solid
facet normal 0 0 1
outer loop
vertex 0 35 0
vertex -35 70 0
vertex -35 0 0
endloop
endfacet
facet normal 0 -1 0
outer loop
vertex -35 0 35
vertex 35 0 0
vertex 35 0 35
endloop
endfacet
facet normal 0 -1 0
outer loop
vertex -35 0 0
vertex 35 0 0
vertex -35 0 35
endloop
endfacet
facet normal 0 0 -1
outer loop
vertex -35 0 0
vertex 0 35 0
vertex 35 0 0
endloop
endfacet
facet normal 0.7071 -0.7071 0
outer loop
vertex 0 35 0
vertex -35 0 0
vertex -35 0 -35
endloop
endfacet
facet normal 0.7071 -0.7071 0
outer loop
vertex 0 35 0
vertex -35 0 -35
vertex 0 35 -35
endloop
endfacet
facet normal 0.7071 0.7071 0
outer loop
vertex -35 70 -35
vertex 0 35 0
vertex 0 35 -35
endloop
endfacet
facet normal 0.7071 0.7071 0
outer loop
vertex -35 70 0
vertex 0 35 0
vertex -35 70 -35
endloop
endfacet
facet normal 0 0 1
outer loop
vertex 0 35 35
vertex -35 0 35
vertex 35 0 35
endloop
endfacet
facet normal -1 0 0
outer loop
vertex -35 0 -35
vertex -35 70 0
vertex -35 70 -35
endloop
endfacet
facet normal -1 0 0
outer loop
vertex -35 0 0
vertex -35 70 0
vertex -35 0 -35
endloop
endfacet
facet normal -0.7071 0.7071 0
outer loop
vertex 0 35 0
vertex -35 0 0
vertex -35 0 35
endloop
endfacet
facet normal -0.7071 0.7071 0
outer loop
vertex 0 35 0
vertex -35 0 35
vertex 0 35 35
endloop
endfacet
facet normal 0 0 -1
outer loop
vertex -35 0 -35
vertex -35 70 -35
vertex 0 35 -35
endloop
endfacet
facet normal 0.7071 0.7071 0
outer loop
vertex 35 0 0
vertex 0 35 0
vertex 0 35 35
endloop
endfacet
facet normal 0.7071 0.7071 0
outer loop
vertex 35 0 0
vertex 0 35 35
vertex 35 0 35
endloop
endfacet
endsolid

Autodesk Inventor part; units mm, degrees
ref_plane "YZ Plane" through (0, 0, 0) normal (1, 0, 0) x (0, 1, 0)
ref_plane "XZ Plane" through (0, 0, 0) normal (0, 1, 0) x (-1, 0, 0)
ref_plane "XY Plane" through (0, 0, 0) normal (0, 0, 1) x (1, 0, 0)
sketch "Sketch1" plane through (0, 0, 0) normal (0, 0, 1) x (1, 0, 0)
  line L0 (-35, 0) -> (0, 35)
  line L1 (0, 35) -> (35, 0)
  line L2 (35, 0) -> (0, 0)
  line L3 (0, 0) -> (0, 35) construction
  line L4 (0, 0) -> (-35, 0)
  line L5 (0, 35) -> (-35, 70)
  line L6 (-35, 70) -> (-35, 0)
  dimension "d0" = 35
extrude "Extrusion1" add sketch "Sketch1" along normal blind 35 contours L0 L1 L2 L4
extrude "Extrusion2" add sketch "Sketch1" against normal blind 35 contours L6 L5 L0
properties part number "B8"
